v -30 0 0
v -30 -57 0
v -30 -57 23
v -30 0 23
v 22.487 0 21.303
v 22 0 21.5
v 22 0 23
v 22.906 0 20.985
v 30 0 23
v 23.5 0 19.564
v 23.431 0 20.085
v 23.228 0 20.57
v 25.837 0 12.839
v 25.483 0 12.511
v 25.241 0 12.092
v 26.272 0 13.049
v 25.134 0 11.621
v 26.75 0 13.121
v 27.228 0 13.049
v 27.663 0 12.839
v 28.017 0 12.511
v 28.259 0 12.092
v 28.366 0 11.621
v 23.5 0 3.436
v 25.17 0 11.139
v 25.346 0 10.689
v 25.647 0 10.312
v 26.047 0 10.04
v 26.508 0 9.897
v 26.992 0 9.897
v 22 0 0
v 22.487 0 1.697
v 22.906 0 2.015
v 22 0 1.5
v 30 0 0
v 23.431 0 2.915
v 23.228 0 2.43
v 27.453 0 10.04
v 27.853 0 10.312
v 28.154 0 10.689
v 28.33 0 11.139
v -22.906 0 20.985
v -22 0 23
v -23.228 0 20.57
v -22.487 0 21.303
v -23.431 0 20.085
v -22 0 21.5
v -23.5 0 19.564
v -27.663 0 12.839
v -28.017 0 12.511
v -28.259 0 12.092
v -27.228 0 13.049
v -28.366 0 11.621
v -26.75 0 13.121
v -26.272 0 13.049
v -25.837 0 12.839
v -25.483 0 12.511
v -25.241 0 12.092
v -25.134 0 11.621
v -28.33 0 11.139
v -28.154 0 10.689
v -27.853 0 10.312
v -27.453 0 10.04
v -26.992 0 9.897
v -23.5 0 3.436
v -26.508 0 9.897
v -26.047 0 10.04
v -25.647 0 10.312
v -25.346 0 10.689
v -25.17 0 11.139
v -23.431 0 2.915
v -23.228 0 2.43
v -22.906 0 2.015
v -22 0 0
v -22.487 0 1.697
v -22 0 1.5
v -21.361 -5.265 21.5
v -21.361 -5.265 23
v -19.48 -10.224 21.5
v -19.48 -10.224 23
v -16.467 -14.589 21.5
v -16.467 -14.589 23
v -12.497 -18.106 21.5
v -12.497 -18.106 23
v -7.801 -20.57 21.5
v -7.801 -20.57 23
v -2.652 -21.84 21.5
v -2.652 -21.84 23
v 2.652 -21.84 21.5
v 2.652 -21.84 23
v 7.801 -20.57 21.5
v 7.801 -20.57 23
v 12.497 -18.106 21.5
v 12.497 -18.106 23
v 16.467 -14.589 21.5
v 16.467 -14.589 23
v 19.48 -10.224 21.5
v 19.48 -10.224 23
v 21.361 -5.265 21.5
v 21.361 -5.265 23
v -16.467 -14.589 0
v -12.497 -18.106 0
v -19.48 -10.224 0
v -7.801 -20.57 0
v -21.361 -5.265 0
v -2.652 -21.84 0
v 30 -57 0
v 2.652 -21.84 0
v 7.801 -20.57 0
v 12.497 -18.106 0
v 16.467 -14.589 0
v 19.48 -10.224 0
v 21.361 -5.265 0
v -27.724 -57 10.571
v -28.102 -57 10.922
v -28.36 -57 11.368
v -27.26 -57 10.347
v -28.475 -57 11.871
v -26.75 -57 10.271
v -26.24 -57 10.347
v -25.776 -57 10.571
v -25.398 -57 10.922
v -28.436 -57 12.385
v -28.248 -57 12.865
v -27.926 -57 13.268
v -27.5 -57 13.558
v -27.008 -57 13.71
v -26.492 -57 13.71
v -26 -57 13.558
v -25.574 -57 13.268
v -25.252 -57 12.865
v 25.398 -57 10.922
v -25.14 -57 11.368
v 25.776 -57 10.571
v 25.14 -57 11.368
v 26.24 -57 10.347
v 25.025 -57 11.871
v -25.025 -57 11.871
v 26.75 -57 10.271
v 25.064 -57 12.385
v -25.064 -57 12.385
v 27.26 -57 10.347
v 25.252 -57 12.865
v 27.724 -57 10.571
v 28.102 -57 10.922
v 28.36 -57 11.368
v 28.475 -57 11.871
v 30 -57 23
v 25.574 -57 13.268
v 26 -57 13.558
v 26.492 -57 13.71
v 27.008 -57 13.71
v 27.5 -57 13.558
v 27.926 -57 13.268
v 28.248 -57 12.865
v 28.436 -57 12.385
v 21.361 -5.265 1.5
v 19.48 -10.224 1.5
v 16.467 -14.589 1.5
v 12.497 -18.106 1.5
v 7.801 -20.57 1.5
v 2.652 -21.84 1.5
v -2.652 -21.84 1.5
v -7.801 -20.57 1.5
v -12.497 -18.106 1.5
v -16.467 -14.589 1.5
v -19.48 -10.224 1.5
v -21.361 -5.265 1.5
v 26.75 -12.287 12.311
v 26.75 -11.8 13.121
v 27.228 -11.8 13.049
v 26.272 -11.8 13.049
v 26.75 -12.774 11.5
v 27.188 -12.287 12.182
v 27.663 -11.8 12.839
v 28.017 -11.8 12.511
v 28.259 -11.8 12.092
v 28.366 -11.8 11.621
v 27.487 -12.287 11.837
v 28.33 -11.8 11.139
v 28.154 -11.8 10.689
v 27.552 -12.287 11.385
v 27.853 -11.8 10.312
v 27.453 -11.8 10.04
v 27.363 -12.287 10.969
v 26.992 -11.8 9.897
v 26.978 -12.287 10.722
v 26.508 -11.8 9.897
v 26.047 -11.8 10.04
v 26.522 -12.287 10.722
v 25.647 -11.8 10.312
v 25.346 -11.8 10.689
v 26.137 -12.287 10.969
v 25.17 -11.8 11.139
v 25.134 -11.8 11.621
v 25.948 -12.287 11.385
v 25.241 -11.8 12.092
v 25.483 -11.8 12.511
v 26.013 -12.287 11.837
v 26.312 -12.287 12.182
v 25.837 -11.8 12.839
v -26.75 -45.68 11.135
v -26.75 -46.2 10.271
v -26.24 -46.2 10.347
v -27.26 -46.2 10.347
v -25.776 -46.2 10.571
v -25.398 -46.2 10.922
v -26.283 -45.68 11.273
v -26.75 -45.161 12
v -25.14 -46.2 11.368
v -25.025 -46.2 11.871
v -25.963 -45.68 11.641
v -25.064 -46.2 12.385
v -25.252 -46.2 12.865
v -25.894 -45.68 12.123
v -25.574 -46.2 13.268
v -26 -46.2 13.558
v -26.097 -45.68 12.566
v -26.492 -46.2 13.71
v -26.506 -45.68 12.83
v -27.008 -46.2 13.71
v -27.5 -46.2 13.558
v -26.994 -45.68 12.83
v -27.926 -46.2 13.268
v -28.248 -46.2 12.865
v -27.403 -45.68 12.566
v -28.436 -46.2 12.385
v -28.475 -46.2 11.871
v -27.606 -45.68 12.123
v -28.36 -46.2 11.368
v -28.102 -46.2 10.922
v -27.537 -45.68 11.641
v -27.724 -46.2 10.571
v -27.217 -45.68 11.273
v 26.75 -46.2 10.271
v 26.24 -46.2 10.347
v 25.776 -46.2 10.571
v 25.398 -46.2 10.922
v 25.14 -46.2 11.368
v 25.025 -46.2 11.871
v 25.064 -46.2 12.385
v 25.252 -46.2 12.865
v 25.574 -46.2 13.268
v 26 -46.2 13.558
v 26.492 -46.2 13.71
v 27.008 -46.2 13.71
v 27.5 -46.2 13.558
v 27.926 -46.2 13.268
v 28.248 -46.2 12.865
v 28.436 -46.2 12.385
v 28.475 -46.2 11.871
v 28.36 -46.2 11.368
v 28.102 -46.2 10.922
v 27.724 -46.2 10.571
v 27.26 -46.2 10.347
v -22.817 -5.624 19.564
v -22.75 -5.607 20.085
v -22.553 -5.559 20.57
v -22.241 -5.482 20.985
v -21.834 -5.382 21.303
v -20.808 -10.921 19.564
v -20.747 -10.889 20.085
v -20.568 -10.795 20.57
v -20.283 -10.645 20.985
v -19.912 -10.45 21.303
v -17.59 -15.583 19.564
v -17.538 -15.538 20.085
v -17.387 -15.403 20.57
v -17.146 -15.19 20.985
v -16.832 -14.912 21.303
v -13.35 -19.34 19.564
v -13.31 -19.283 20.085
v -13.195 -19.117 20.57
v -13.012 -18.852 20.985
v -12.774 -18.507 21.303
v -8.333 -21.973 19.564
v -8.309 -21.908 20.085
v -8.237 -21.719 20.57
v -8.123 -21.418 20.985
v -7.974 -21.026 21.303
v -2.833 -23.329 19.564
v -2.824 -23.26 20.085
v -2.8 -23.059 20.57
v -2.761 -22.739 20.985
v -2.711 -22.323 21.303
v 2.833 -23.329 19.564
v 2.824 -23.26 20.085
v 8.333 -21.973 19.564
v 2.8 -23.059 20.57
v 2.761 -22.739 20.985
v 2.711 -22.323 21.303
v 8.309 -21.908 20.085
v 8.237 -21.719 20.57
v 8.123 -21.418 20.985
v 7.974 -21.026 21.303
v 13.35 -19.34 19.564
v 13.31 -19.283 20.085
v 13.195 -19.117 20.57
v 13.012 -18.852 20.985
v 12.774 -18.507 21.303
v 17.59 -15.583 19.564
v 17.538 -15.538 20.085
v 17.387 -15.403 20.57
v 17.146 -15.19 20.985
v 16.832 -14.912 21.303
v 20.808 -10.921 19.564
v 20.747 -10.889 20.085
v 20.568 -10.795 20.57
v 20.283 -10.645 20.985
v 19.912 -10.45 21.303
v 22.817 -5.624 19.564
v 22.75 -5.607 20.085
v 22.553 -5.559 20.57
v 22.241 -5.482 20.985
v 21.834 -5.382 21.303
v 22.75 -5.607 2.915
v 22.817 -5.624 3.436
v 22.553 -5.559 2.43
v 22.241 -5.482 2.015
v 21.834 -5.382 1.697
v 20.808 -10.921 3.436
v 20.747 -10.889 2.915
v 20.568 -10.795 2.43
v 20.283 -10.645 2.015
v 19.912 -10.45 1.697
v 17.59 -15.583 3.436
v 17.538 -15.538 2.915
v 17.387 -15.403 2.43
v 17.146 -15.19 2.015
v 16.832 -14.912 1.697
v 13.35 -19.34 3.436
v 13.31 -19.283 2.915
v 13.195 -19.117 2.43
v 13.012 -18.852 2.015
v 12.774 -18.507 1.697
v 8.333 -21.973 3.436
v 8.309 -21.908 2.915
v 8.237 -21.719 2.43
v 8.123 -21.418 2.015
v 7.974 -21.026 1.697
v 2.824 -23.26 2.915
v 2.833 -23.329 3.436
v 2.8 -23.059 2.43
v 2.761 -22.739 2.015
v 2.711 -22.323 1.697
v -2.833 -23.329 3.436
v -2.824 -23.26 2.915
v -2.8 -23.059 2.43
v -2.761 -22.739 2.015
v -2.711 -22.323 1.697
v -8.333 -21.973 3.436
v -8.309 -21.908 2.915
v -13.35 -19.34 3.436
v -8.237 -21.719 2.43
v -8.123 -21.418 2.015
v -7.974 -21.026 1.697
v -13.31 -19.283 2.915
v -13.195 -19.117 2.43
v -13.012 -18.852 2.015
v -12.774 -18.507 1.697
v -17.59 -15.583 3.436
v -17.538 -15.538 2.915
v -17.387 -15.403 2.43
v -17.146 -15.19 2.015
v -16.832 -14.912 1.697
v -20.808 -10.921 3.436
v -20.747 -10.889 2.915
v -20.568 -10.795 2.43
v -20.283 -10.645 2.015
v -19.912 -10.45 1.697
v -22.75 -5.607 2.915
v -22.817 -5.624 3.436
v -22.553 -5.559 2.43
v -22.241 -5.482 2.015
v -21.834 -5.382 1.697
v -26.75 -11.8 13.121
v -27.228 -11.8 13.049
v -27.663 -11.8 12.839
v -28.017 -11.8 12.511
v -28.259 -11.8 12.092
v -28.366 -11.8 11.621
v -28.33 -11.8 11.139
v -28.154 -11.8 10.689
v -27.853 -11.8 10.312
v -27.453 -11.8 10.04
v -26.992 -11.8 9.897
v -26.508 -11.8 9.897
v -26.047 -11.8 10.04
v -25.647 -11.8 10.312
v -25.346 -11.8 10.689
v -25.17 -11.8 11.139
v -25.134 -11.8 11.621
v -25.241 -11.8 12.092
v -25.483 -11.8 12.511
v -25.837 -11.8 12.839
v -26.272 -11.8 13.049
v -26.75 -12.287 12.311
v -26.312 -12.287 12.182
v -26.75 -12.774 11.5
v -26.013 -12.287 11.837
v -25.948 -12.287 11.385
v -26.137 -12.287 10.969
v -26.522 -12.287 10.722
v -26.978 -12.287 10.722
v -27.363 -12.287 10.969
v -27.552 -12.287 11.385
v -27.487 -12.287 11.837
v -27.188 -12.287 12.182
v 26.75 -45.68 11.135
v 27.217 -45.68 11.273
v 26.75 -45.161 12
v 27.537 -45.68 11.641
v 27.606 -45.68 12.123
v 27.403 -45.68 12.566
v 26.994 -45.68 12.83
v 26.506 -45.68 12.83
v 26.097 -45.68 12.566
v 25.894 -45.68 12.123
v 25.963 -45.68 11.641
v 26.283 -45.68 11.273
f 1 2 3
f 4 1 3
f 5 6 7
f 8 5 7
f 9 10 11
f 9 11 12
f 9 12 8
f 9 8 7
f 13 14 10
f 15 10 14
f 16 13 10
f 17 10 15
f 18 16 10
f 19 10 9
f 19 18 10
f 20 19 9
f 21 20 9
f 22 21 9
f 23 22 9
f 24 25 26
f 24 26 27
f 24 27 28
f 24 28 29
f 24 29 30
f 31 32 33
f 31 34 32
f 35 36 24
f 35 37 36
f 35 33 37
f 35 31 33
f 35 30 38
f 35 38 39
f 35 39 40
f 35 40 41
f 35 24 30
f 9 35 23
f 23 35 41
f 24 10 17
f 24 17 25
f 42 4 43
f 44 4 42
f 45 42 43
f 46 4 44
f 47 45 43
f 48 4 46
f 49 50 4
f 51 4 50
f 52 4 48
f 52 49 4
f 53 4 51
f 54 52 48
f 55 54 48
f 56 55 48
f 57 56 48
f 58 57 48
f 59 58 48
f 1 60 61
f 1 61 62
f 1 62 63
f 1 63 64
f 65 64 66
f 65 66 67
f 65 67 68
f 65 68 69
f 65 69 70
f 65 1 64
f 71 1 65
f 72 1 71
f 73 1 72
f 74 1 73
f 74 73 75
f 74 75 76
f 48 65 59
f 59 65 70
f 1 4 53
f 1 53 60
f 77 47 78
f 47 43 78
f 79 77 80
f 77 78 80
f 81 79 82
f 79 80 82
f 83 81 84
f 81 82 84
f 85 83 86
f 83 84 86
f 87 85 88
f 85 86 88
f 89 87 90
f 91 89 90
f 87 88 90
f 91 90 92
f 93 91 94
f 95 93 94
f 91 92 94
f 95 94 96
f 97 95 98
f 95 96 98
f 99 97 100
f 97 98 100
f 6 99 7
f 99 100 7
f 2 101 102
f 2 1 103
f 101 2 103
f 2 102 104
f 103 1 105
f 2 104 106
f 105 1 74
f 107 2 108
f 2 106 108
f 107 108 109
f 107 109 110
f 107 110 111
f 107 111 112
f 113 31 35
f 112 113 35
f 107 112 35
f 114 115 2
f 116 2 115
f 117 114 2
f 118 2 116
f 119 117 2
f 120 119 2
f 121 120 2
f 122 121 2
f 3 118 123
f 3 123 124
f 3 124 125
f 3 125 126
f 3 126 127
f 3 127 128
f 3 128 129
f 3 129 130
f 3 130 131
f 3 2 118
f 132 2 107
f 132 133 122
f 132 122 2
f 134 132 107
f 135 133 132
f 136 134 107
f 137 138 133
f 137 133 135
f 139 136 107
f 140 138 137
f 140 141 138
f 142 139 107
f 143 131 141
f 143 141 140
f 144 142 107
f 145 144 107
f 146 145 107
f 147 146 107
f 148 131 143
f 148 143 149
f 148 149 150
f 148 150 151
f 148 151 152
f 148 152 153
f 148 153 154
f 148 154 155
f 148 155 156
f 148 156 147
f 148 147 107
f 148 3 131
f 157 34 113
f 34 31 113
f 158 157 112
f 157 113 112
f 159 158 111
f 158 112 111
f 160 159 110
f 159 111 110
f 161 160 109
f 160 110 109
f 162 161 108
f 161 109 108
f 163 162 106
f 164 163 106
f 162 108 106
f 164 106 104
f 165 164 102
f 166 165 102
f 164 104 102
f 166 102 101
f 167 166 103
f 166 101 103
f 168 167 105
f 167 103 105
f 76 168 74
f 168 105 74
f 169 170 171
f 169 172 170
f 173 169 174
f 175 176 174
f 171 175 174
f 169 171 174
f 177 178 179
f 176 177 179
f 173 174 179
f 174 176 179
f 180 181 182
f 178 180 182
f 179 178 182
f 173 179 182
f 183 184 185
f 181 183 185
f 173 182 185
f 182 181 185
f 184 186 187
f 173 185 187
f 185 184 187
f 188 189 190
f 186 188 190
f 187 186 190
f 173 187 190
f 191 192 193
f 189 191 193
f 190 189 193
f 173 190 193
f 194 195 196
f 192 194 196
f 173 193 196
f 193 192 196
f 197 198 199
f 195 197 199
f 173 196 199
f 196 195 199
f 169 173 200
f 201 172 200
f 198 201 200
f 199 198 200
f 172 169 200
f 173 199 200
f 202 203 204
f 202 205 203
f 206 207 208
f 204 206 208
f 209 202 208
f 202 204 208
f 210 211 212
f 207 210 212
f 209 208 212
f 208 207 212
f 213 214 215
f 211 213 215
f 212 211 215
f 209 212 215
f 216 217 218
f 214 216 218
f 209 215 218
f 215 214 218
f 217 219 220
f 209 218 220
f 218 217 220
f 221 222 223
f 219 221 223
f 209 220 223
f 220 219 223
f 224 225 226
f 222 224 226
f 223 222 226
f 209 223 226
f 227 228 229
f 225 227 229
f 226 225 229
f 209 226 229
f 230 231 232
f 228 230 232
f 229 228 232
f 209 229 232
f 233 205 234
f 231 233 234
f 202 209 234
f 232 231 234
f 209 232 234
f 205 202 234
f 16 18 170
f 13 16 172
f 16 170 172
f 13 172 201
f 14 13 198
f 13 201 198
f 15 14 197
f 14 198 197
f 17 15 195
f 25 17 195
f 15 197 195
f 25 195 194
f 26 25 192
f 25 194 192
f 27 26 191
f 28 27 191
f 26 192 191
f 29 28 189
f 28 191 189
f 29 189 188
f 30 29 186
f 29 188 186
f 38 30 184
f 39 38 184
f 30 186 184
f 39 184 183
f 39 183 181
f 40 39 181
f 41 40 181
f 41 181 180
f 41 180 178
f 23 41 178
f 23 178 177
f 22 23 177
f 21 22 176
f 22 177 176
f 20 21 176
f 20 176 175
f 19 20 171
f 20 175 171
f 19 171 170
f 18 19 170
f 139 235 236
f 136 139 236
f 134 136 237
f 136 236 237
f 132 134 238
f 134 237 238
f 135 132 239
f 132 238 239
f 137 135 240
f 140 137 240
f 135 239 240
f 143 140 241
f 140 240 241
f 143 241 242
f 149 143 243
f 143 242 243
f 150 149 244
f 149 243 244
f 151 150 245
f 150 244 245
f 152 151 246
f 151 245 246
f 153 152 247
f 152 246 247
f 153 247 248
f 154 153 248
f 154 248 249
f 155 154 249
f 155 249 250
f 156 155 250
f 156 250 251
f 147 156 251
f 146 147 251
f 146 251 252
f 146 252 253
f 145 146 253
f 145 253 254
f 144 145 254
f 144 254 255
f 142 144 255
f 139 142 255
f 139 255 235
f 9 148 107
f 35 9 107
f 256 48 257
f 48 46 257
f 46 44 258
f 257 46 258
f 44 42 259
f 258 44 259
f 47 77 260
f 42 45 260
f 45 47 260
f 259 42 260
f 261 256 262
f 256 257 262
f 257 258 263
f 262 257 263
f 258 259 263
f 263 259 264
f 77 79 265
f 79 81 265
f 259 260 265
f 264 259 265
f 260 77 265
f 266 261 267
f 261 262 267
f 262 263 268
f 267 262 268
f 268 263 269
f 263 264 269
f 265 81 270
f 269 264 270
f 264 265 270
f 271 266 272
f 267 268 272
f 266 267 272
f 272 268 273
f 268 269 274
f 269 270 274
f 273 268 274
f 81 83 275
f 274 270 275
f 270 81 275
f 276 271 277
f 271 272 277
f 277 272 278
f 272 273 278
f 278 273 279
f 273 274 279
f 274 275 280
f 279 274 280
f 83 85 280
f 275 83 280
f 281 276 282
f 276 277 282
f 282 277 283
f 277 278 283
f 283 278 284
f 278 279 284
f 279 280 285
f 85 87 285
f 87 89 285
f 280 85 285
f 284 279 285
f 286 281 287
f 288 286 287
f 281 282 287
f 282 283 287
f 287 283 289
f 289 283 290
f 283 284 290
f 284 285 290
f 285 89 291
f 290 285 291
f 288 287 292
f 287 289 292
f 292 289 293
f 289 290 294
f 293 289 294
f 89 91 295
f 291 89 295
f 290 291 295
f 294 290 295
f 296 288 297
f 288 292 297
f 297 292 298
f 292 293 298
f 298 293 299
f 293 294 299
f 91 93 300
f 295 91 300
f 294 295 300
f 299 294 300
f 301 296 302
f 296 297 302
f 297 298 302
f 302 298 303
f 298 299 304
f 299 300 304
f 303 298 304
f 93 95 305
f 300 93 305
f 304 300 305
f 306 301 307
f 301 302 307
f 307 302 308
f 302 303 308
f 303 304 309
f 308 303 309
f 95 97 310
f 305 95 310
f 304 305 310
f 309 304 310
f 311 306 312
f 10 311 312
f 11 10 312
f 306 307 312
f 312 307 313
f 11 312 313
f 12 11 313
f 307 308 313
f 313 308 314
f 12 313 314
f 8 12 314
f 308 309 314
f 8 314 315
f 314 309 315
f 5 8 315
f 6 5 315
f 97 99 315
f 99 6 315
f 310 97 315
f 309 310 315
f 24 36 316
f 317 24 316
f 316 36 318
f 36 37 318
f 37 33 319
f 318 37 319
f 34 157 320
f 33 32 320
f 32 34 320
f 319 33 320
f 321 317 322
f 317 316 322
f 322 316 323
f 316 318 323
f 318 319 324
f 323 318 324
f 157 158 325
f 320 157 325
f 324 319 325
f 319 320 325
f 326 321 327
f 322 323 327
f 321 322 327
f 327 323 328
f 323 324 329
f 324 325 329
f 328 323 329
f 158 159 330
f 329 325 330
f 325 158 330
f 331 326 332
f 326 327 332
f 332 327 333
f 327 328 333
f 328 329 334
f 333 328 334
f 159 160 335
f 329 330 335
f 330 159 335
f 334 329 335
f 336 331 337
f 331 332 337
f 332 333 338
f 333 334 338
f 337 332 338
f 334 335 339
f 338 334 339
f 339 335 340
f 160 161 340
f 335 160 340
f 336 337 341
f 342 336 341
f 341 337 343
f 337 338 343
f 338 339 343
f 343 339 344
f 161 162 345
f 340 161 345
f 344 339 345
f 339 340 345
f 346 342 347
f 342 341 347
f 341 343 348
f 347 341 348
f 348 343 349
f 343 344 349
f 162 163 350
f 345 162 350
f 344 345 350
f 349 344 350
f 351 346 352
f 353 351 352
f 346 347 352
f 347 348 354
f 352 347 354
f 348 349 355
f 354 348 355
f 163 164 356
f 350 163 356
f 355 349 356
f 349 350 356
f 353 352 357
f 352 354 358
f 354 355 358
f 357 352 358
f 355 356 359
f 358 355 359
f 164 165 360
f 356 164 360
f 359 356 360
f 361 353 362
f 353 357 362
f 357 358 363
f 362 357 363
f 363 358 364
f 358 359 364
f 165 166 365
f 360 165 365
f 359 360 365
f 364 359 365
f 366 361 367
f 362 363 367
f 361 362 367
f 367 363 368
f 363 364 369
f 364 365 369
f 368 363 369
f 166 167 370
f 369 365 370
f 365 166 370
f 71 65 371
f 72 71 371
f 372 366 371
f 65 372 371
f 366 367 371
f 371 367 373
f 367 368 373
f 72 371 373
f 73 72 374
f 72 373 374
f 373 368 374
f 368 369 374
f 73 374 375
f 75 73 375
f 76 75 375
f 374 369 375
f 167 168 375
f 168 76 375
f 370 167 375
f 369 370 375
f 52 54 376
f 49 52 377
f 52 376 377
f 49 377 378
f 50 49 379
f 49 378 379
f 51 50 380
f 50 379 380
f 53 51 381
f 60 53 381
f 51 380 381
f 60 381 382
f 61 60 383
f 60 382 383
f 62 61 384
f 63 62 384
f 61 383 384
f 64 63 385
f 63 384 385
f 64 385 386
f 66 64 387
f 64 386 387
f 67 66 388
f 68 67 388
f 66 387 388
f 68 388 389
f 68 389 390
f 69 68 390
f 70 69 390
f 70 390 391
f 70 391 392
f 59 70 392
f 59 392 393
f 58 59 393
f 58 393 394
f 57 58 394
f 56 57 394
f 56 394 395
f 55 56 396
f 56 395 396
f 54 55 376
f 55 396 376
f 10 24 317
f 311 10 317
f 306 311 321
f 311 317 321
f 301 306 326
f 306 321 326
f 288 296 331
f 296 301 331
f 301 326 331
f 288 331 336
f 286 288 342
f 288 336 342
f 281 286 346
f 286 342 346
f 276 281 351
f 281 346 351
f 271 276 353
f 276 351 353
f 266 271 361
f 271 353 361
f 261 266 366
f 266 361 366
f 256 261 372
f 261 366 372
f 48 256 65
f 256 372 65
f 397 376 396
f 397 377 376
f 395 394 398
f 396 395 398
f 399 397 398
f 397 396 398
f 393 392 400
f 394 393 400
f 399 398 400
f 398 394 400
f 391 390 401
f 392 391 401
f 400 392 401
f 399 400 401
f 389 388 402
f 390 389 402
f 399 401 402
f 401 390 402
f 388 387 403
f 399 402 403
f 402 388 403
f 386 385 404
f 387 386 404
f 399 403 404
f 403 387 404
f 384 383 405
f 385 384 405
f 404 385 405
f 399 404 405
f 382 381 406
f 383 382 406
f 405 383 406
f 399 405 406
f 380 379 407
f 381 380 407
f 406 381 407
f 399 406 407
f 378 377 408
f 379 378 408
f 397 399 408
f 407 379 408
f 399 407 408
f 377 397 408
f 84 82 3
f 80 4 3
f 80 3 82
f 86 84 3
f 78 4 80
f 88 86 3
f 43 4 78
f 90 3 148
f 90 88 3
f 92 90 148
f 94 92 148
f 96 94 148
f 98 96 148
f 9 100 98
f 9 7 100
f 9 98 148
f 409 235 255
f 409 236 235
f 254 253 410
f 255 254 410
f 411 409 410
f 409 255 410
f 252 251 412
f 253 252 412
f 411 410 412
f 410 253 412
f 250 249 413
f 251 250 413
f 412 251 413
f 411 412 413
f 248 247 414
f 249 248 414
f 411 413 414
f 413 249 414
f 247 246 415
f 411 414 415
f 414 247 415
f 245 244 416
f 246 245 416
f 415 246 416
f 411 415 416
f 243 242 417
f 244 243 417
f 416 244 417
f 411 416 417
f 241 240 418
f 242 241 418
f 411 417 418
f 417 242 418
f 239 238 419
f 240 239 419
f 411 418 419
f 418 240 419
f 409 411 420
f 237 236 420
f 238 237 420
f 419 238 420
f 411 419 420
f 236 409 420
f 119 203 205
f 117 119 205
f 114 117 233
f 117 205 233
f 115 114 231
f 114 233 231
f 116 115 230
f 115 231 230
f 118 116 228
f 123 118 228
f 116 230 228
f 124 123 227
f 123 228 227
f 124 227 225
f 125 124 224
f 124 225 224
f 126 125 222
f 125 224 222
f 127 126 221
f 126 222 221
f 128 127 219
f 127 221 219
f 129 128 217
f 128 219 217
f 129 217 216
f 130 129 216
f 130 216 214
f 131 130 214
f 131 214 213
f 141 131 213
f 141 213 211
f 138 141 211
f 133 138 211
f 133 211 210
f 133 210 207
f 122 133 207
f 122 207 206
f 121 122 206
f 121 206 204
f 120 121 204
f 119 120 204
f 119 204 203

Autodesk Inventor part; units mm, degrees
ref_plane "YZ Plane" through (0, 0, 0) normal (1, 0, 0) x (0, 1, 0)
ref_plane "XZ Plane" through (0, 0, 0) normal (0, 1, 0) x (-1, 0, 0)
ref_plane "XY Plane" through (0, 0, 0) normal (0, 0, 1) x (1, 0, 0)
sketch "Sketch1" plane through (0, 0, 0) normal (0, 0, 1) x (1, 0, 0)
  arc A0 (-23.5, 0) -> (23.5, 0) centre (0, 0) ccw
  line L0 (30, 0) -> (30, -30)
  line L1 (30, -30) -> (-30, -30)
  line L2 (-30, -30) -> (-30, 0)
  line L3 (-30, 0) -> (-23.5, 0)
  line L4 (23.5, 0) -> (30, 0)
  dimension "d0" = 47
  dimension "d1" = 30
  dimension "d3" = 60
  dimension "d4" = 30
extrude "Extrusion1" add sketch "Sketch1" along normal blind 23
ref_plane "Work Plane1" through (0, 0, 23) normal (0, 0, 1) x (1, 0, 0)
sketch "Sketch2" plane through (0, 0, 23) normal (0, 0, 1) x (1, 0, 0)
  line L0 (30, 0) -> (23.5, 0) projected
  arc A0 (-23.5, 0) -> (23.5, 0) centre (0, 0) ccw
  arc A1 (-22, 0) -> (22, 0) centre (0, 0) ccw
  line L1 (-23.5, 0) -> (-22, 0)
  line L2 (22, 0) -> (23.5, 0)
  dimension "d8" = 44
extrude "Extrusion2" add sketch "Sketch2" against normal blind 1.5
fillet "Fillet1" radius 2 1 edges at (0, -23.5, 21.5)
ref_plane "Work Plane2" through (0, 0, 0) normal (0, 0, -1) x (-1, 0, 0)
sketch "Sketch3" plane through (0, 0, 0) normal (0, 0, -1) x (-1, 0, 0)
  arc A0 (-23.5, 0) -> (23.5, 0) centre (0, 0) ccw
  arc A1 (-22, 0) -> (22, 0) centre (0, 0) ccw
  line L0 (23.5, 0) -> (30, 0) projected
  line L1 (23.5, 0) -> (22, 0)
  line L2 (-22, 0) -> (-23.5, 0)
extrude "Extrusion3" add sketch "Sketch3" against normal blind 1.5
fillet "Fillet2" radius 2 1 edges at (0, -23.5, 1.5)
sketch "Sketch4" plane through (-30, 0, 23) normal (0, 1, 0) x (1, 0, 0)
  line L0 (-12, 23) -> (72, 23) projected
  line L1 (0, 23) -> (0, 0) projected
  line L2 (53.5, 19.5635) -> (53.5, 3.4365) projected
  point P0 (30, 23)
  point P1 (3.25, 11.5)
  point P2 (56.75, 11.5)
  dimension "d16" = 11.5
  dimension "d17" = 3.25
  dimension "d18" = 3.25
hole "Hole1" at (-26.75, 0, 11.5) at (26.75, 0, 11.5) direction (0, -1, 0) diameter 3.242 depth 11.8 tip angle 118 thread size "M4x0.7" class "6H" standard "ISO Metric profile"
sketch "Sketch5" plane through (-30, -30, 0) normal (0, -1, 0) x (1, 0, 0)
  line L0 (0, 0) -> (0, 23) projected
  line L1 (0, 0) -> (60, 0) projected
  circle A0 centre (3.25, 11.5) radius 2.5
  circle A1 centre (56.75, 11.5) radius 1.621 projected
  circle A2 centre (56.75, 11.5) radius 2.5
  point P0 (30, 0)
  dimension "d26" = 3.25
  dimension "d27" = 11.5
  dimension "d28" = 5
  dimension "d29" = 5
sketch "Sketch6" plane through (-30, -30, 0) normal (0, -1, 0) x (1, 0, 0)
  line L0 (0, 23) -> (60, 23) projected
  line L1 (0, 0) -> (60, 0) projected
  line L2 (0, 23) -> (60, 23)
  line L3 (60, 23) -> (60, 0)
  line L4 (60, 0) -> (0, 0)
  line L5 (0, 0) -> (0, 23)
  point P0 (30, 0)
  point P1 (60, 23)
extrude "Extrusion4" add sketch "Sketch6" along normal blind 27
sketch "Sketch8" plane through (-30, -57, 0) normal (0, -1, 0) x (1, 0, 0)
  line L0 (60, 0) -> (60, 23) projected
  line L1 (0, 23) -> (0, 0) projected
  line L2 (60, 23) -> (0, 23) projected
  point P0 (30, 0)
  point P1 (56.75, 12)
  point P2 (3.25, 12)
  point P3 (60, 11.5)
  point P4 (0, 11.5)
  dimension "d42" = 3.25
  dimension "d43" = 3.25
  dimension "d44" = 11
  dimension "d45" = 11
hole "Hole3" at (26.75, -57, 12) at (-26.75, -57, 12) direction (0, 1, 0) diameter 3.4587 depth 10.8 tip angle 118 thread size "M4x0.5" class "6H" standard "ISO Metric profile"
equation "\"BendRadius\" = Thickness"
equation "\"BendReliefWidth\" = Thickness"
equation "\"BendReliefDepth\" = 0.5 * Thickness"
equation "\"CornerReliefSize\" = 4 * Thickness"
equation "\"MinimumRemnant\" = 2 * Thickness"
equation "\"TransitionRadius\" = BendRadius"
equation "\"JacobiRadiusSize\" = BendRadius"
equation "\"GapSize\" = Thickness"
equation "\"Thickness\" = 0.5"
properties part number "Bearing housing bottom"
